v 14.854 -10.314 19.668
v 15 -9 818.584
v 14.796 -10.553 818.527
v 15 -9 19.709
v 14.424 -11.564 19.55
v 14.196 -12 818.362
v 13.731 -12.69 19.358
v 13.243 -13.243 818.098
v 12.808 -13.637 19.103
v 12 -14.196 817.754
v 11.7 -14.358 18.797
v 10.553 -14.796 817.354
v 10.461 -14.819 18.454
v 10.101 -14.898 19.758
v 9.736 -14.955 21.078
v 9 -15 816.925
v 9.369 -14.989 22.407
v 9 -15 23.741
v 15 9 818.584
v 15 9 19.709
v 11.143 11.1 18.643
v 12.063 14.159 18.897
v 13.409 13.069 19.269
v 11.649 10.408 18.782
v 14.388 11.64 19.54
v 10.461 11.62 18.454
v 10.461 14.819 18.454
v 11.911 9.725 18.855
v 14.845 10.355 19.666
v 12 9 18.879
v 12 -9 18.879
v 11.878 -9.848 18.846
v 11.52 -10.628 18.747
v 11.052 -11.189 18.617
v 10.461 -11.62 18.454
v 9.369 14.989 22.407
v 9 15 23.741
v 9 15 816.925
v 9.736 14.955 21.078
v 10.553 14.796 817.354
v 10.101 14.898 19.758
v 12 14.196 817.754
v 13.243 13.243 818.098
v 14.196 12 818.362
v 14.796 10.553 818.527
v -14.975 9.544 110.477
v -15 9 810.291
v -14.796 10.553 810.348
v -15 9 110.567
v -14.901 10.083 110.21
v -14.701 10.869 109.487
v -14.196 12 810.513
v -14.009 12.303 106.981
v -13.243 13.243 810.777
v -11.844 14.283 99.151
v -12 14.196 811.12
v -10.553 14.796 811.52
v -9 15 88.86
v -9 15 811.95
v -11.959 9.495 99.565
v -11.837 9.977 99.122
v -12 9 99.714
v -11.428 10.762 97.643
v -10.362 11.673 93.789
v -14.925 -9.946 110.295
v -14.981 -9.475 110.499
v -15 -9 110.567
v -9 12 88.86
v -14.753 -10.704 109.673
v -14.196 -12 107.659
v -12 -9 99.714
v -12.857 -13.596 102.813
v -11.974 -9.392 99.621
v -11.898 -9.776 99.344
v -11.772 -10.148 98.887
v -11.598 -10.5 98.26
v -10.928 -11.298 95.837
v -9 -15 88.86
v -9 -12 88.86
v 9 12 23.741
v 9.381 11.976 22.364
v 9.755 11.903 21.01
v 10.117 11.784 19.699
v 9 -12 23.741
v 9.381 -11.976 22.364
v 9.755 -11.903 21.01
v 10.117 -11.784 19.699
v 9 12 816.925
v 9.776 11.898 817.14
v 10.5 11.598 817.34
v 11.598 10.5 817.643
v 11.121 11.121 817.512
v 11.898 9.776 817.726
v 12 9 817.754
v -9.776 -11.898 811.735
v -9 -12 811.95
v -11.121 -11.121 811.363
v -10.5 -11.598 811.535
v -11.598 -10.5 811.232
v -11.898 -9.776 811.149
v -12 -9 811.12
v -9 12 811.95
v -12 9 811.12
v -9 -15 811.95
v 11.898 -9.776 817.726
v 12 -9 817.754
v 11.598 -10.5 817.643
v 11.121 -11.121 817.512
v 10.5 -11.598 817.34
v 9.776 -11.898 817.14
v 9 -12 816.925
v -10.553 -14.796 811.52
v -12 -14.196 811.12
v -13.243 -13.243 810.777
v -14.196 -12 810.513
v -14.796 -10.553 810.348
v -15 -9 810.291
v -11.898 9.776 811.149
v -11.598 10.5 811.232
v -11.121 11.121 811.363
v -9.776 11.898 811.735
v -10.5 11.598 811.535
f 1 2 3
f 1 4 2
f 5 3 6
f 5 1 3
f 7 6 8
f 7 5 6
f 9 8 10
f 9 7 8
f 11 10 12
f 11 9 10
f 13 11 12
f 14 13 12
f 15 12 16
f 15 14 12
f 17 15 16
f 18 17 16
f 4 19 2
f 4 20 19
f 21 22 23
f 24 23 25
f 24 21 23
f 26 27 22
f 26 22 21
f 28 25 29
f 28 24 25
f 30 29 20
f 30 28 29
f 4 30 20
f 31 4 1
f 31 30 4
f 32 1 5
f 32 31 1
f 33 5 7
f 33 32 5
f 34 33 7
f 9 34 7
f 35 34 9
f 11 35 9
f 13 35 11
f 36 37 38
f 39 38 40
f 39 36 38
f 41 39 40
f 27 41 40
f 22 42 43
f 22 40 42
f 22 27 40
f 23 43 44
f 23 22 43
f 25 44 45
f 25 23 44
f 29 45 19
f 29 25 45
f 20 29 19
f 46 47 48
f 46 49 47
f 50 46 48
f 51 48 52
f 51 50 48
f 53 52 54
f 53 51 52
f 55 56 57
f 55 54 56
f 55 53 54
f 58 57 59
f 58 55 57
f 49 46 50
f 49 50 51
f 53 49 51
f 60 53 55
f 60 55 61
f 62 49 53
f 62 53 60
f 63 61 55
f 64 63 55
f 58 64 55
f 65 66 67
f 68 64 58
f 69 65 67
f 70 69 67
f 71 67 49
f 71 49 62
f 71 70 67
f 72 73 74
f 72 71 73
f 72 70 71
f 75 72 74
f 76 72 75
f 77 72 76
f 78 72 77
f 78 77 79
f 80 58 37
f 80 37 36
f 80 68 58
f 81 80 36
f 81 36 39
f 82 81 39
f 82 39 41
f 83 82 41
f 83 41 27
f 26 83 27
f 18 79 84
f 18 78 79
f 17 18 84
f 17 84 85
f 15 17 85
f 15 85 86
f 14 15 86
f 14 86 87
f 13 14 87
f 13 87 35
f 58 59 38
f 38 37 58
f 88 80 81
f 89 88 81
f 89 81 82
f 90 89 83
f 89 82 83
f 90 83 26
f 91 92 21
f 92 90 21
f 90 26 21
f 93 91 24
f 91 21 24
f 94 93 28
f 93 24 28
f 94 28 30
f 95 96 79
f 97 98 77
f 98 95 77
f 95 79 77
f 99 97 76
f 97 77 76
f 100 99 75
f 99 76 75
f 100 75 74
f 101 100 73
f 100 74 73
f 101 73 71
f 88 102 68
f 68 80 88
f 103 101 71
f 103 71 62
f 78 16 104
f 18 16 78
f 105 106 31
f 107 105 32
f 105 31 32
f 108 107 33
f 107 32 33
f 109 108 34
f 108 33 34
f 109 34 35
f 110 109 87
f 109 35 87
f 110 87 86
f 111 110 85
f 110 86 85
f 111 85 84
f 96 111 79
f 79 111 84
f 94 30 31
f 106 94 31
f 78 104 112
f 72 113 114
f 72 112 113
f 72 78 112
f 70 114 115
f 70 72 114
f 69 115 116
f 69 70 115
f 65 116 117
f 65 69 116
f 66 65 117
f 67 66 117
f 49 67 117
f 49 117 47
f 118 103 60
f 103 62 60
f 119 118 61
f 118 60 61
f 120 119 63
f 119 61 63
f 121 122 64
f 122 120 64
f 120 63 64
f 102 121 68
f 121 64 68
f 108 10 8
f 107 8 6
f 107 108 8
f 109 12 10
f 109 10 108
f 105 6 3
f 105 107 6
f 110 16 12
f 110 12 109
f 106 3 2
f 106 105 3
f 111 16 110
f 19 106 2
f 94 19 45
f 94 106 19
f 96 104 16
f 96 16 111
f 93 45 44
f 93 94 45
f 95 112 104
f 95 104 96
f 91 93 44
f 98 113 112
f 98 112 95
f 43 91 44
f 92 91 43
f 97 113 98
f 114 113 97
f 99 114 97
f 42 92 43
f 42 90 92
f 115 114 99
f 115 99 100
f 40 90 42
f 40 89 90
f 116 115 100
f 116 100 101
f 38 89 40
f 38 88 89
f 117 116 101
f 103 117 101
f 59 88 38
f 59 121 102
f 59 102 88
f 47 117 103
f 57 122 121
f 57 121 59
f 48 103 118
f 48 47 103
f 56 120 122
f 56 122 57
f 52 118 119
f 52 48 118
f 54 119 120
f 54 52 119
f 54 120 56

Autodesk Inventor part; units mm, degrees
ref_plane "Start Plane" through (0, 0, 18.4542) normal (0, 0, 1) x (1, 0, 0)
ref_plane "End Plane" through (0, 0, 818.5838) normal (0, 0, 1) x (1, 0, 0)
sketch "Sketch" plane through (0, 0, 0) normal (0, 0, 1) x (1, 0, 0)
  line L0 (-15, -9) -> (-15, 9)
  line L1 (-9, 15) -> (9, 15)
  line L2 (15, 9) -> (15, -9)
  line L3 (9, -15) -> (-9, -15)
  arc A0 (-15, -9) -> (-9, -15) centre (-9, -9) ccw
  arc A1 (-9, 15) -> (-15, 9) centre (-9, 9) ccw
  arc A2 (15, 9) -> (9, 15) centre (9, 9) ccw
  arc A3 (9, -15) -> (15, -9) centre (9, -9) ccw
  arc A4 (-9, 12) -> (-12, 9) centre (-9, 9) ccw
  line L4 (-9, 12) -> (9, 12)
  arc A5 (12, 9) -> (9, 12) centre (9, 9) ccw
  line L5 (12, 9) -> (12, -9)
  arc A6 (9, -12) -> (12, -9) centre (9, -9) ccw
  line L6 (9, -12) -> (-9, -12)
  arc A7 (-12, -9) -> (-9, -12) centre (-9, -9) ccw
  line L7 (-12, -9) -> (-12, 9)
  line L8 (0, 22.7397) -> (0, -22.7397) construction
  line L9 (-22.7397, 0) -> (22.7397, 0) construction
  dimension "d7" = 6
  dimension "d10" = 30
  dimension "d11" = 30
  dimension "d12" = 3
  dimension "d15" = 15
  dimension "d16" = 15
extrude "Body" add sketch "Sketch" along normal up to surface (800.1295 mm away) from surface at 18.4542
sketch "Sketch3" plane through (0, 0, 0) normal (0, 0, 1) x (1, 0, 0)
  line L0 (0, 0) -> (10, 0)
ref_plane "Work Plane3" through (0, 0, 0) normal (0, -1, 0) x (1, 0, 0)
ref_plane "Work Plane4" through (-691.072, 9, 623.4136) normal (-0.2664258, 0, 0.9638554) x (0.9638554, 0, 0.2664258)
split "Split1" plane through (-691.072, 9, 623.4136) removes the side toward (-0.2664258, 0, 0.9638554)
ref_plane "Work Plane5" through (-198.6828, -9, 775.0807) normal (-0.9638554, 0, -0.2664258) x (-0.2664258, 0, 0.9638554)
split "Split2" plane through (-198.6828, -9, 775.0807) removes the side toward (-0.9638554, 0, -0.2664258)
ref_plane "Work Plane6" through (-3.9964, -9, 14.4578) normal (0.2664258, 0, -0.9638554) x (-0.9638554, 0, -0.2664258)
split "Split3" plane through (-3.9964, -9, 14.4578) removes the side toward (0.2664258, 0, -0.9638554)
sketch "Sketch4" plane through (0, 0, 0) normal (0, -1, 0) x (1, 0, 0)
  line L0 (-2, 18.4542) -> (12, 18.4542) projected
  line L1 (-2, 818.5838) -> (12, 818.5838) projected
  dimension "d18" = 800.1295
equation "\"d7\" = G_IR"
equation "\"d10\" = G_H"
equation "\"d11\" = G_W"
equation "\"d12\" = G_T"
equation "\"d15\" = 0.5 * d10"
equation "\"d16\" = 0.5 * d11"
equation "\"d3\" = G_L"
equation "\"G_W\" = 30"
equation "\"G_H\" = 30"
equation "\"G_T\" = 3"
equation "\"G_IR\" = 6"
equation "\"G_L\" = d18"
equation "\"G_OFFSET_START\" = -18.45422"
equation "\"G_OFFSET_END\" = -11.41625"
equation "\"d13\" = -G_OFFSET_START"
equation "\"d14\" = G_OFFSET_END + B_L"
equation "\"B_L\" = 830"
properties part number "DIN EN 10219-2 - 30 x 30 x 3  - 800.13" material "Steel, Mild"
